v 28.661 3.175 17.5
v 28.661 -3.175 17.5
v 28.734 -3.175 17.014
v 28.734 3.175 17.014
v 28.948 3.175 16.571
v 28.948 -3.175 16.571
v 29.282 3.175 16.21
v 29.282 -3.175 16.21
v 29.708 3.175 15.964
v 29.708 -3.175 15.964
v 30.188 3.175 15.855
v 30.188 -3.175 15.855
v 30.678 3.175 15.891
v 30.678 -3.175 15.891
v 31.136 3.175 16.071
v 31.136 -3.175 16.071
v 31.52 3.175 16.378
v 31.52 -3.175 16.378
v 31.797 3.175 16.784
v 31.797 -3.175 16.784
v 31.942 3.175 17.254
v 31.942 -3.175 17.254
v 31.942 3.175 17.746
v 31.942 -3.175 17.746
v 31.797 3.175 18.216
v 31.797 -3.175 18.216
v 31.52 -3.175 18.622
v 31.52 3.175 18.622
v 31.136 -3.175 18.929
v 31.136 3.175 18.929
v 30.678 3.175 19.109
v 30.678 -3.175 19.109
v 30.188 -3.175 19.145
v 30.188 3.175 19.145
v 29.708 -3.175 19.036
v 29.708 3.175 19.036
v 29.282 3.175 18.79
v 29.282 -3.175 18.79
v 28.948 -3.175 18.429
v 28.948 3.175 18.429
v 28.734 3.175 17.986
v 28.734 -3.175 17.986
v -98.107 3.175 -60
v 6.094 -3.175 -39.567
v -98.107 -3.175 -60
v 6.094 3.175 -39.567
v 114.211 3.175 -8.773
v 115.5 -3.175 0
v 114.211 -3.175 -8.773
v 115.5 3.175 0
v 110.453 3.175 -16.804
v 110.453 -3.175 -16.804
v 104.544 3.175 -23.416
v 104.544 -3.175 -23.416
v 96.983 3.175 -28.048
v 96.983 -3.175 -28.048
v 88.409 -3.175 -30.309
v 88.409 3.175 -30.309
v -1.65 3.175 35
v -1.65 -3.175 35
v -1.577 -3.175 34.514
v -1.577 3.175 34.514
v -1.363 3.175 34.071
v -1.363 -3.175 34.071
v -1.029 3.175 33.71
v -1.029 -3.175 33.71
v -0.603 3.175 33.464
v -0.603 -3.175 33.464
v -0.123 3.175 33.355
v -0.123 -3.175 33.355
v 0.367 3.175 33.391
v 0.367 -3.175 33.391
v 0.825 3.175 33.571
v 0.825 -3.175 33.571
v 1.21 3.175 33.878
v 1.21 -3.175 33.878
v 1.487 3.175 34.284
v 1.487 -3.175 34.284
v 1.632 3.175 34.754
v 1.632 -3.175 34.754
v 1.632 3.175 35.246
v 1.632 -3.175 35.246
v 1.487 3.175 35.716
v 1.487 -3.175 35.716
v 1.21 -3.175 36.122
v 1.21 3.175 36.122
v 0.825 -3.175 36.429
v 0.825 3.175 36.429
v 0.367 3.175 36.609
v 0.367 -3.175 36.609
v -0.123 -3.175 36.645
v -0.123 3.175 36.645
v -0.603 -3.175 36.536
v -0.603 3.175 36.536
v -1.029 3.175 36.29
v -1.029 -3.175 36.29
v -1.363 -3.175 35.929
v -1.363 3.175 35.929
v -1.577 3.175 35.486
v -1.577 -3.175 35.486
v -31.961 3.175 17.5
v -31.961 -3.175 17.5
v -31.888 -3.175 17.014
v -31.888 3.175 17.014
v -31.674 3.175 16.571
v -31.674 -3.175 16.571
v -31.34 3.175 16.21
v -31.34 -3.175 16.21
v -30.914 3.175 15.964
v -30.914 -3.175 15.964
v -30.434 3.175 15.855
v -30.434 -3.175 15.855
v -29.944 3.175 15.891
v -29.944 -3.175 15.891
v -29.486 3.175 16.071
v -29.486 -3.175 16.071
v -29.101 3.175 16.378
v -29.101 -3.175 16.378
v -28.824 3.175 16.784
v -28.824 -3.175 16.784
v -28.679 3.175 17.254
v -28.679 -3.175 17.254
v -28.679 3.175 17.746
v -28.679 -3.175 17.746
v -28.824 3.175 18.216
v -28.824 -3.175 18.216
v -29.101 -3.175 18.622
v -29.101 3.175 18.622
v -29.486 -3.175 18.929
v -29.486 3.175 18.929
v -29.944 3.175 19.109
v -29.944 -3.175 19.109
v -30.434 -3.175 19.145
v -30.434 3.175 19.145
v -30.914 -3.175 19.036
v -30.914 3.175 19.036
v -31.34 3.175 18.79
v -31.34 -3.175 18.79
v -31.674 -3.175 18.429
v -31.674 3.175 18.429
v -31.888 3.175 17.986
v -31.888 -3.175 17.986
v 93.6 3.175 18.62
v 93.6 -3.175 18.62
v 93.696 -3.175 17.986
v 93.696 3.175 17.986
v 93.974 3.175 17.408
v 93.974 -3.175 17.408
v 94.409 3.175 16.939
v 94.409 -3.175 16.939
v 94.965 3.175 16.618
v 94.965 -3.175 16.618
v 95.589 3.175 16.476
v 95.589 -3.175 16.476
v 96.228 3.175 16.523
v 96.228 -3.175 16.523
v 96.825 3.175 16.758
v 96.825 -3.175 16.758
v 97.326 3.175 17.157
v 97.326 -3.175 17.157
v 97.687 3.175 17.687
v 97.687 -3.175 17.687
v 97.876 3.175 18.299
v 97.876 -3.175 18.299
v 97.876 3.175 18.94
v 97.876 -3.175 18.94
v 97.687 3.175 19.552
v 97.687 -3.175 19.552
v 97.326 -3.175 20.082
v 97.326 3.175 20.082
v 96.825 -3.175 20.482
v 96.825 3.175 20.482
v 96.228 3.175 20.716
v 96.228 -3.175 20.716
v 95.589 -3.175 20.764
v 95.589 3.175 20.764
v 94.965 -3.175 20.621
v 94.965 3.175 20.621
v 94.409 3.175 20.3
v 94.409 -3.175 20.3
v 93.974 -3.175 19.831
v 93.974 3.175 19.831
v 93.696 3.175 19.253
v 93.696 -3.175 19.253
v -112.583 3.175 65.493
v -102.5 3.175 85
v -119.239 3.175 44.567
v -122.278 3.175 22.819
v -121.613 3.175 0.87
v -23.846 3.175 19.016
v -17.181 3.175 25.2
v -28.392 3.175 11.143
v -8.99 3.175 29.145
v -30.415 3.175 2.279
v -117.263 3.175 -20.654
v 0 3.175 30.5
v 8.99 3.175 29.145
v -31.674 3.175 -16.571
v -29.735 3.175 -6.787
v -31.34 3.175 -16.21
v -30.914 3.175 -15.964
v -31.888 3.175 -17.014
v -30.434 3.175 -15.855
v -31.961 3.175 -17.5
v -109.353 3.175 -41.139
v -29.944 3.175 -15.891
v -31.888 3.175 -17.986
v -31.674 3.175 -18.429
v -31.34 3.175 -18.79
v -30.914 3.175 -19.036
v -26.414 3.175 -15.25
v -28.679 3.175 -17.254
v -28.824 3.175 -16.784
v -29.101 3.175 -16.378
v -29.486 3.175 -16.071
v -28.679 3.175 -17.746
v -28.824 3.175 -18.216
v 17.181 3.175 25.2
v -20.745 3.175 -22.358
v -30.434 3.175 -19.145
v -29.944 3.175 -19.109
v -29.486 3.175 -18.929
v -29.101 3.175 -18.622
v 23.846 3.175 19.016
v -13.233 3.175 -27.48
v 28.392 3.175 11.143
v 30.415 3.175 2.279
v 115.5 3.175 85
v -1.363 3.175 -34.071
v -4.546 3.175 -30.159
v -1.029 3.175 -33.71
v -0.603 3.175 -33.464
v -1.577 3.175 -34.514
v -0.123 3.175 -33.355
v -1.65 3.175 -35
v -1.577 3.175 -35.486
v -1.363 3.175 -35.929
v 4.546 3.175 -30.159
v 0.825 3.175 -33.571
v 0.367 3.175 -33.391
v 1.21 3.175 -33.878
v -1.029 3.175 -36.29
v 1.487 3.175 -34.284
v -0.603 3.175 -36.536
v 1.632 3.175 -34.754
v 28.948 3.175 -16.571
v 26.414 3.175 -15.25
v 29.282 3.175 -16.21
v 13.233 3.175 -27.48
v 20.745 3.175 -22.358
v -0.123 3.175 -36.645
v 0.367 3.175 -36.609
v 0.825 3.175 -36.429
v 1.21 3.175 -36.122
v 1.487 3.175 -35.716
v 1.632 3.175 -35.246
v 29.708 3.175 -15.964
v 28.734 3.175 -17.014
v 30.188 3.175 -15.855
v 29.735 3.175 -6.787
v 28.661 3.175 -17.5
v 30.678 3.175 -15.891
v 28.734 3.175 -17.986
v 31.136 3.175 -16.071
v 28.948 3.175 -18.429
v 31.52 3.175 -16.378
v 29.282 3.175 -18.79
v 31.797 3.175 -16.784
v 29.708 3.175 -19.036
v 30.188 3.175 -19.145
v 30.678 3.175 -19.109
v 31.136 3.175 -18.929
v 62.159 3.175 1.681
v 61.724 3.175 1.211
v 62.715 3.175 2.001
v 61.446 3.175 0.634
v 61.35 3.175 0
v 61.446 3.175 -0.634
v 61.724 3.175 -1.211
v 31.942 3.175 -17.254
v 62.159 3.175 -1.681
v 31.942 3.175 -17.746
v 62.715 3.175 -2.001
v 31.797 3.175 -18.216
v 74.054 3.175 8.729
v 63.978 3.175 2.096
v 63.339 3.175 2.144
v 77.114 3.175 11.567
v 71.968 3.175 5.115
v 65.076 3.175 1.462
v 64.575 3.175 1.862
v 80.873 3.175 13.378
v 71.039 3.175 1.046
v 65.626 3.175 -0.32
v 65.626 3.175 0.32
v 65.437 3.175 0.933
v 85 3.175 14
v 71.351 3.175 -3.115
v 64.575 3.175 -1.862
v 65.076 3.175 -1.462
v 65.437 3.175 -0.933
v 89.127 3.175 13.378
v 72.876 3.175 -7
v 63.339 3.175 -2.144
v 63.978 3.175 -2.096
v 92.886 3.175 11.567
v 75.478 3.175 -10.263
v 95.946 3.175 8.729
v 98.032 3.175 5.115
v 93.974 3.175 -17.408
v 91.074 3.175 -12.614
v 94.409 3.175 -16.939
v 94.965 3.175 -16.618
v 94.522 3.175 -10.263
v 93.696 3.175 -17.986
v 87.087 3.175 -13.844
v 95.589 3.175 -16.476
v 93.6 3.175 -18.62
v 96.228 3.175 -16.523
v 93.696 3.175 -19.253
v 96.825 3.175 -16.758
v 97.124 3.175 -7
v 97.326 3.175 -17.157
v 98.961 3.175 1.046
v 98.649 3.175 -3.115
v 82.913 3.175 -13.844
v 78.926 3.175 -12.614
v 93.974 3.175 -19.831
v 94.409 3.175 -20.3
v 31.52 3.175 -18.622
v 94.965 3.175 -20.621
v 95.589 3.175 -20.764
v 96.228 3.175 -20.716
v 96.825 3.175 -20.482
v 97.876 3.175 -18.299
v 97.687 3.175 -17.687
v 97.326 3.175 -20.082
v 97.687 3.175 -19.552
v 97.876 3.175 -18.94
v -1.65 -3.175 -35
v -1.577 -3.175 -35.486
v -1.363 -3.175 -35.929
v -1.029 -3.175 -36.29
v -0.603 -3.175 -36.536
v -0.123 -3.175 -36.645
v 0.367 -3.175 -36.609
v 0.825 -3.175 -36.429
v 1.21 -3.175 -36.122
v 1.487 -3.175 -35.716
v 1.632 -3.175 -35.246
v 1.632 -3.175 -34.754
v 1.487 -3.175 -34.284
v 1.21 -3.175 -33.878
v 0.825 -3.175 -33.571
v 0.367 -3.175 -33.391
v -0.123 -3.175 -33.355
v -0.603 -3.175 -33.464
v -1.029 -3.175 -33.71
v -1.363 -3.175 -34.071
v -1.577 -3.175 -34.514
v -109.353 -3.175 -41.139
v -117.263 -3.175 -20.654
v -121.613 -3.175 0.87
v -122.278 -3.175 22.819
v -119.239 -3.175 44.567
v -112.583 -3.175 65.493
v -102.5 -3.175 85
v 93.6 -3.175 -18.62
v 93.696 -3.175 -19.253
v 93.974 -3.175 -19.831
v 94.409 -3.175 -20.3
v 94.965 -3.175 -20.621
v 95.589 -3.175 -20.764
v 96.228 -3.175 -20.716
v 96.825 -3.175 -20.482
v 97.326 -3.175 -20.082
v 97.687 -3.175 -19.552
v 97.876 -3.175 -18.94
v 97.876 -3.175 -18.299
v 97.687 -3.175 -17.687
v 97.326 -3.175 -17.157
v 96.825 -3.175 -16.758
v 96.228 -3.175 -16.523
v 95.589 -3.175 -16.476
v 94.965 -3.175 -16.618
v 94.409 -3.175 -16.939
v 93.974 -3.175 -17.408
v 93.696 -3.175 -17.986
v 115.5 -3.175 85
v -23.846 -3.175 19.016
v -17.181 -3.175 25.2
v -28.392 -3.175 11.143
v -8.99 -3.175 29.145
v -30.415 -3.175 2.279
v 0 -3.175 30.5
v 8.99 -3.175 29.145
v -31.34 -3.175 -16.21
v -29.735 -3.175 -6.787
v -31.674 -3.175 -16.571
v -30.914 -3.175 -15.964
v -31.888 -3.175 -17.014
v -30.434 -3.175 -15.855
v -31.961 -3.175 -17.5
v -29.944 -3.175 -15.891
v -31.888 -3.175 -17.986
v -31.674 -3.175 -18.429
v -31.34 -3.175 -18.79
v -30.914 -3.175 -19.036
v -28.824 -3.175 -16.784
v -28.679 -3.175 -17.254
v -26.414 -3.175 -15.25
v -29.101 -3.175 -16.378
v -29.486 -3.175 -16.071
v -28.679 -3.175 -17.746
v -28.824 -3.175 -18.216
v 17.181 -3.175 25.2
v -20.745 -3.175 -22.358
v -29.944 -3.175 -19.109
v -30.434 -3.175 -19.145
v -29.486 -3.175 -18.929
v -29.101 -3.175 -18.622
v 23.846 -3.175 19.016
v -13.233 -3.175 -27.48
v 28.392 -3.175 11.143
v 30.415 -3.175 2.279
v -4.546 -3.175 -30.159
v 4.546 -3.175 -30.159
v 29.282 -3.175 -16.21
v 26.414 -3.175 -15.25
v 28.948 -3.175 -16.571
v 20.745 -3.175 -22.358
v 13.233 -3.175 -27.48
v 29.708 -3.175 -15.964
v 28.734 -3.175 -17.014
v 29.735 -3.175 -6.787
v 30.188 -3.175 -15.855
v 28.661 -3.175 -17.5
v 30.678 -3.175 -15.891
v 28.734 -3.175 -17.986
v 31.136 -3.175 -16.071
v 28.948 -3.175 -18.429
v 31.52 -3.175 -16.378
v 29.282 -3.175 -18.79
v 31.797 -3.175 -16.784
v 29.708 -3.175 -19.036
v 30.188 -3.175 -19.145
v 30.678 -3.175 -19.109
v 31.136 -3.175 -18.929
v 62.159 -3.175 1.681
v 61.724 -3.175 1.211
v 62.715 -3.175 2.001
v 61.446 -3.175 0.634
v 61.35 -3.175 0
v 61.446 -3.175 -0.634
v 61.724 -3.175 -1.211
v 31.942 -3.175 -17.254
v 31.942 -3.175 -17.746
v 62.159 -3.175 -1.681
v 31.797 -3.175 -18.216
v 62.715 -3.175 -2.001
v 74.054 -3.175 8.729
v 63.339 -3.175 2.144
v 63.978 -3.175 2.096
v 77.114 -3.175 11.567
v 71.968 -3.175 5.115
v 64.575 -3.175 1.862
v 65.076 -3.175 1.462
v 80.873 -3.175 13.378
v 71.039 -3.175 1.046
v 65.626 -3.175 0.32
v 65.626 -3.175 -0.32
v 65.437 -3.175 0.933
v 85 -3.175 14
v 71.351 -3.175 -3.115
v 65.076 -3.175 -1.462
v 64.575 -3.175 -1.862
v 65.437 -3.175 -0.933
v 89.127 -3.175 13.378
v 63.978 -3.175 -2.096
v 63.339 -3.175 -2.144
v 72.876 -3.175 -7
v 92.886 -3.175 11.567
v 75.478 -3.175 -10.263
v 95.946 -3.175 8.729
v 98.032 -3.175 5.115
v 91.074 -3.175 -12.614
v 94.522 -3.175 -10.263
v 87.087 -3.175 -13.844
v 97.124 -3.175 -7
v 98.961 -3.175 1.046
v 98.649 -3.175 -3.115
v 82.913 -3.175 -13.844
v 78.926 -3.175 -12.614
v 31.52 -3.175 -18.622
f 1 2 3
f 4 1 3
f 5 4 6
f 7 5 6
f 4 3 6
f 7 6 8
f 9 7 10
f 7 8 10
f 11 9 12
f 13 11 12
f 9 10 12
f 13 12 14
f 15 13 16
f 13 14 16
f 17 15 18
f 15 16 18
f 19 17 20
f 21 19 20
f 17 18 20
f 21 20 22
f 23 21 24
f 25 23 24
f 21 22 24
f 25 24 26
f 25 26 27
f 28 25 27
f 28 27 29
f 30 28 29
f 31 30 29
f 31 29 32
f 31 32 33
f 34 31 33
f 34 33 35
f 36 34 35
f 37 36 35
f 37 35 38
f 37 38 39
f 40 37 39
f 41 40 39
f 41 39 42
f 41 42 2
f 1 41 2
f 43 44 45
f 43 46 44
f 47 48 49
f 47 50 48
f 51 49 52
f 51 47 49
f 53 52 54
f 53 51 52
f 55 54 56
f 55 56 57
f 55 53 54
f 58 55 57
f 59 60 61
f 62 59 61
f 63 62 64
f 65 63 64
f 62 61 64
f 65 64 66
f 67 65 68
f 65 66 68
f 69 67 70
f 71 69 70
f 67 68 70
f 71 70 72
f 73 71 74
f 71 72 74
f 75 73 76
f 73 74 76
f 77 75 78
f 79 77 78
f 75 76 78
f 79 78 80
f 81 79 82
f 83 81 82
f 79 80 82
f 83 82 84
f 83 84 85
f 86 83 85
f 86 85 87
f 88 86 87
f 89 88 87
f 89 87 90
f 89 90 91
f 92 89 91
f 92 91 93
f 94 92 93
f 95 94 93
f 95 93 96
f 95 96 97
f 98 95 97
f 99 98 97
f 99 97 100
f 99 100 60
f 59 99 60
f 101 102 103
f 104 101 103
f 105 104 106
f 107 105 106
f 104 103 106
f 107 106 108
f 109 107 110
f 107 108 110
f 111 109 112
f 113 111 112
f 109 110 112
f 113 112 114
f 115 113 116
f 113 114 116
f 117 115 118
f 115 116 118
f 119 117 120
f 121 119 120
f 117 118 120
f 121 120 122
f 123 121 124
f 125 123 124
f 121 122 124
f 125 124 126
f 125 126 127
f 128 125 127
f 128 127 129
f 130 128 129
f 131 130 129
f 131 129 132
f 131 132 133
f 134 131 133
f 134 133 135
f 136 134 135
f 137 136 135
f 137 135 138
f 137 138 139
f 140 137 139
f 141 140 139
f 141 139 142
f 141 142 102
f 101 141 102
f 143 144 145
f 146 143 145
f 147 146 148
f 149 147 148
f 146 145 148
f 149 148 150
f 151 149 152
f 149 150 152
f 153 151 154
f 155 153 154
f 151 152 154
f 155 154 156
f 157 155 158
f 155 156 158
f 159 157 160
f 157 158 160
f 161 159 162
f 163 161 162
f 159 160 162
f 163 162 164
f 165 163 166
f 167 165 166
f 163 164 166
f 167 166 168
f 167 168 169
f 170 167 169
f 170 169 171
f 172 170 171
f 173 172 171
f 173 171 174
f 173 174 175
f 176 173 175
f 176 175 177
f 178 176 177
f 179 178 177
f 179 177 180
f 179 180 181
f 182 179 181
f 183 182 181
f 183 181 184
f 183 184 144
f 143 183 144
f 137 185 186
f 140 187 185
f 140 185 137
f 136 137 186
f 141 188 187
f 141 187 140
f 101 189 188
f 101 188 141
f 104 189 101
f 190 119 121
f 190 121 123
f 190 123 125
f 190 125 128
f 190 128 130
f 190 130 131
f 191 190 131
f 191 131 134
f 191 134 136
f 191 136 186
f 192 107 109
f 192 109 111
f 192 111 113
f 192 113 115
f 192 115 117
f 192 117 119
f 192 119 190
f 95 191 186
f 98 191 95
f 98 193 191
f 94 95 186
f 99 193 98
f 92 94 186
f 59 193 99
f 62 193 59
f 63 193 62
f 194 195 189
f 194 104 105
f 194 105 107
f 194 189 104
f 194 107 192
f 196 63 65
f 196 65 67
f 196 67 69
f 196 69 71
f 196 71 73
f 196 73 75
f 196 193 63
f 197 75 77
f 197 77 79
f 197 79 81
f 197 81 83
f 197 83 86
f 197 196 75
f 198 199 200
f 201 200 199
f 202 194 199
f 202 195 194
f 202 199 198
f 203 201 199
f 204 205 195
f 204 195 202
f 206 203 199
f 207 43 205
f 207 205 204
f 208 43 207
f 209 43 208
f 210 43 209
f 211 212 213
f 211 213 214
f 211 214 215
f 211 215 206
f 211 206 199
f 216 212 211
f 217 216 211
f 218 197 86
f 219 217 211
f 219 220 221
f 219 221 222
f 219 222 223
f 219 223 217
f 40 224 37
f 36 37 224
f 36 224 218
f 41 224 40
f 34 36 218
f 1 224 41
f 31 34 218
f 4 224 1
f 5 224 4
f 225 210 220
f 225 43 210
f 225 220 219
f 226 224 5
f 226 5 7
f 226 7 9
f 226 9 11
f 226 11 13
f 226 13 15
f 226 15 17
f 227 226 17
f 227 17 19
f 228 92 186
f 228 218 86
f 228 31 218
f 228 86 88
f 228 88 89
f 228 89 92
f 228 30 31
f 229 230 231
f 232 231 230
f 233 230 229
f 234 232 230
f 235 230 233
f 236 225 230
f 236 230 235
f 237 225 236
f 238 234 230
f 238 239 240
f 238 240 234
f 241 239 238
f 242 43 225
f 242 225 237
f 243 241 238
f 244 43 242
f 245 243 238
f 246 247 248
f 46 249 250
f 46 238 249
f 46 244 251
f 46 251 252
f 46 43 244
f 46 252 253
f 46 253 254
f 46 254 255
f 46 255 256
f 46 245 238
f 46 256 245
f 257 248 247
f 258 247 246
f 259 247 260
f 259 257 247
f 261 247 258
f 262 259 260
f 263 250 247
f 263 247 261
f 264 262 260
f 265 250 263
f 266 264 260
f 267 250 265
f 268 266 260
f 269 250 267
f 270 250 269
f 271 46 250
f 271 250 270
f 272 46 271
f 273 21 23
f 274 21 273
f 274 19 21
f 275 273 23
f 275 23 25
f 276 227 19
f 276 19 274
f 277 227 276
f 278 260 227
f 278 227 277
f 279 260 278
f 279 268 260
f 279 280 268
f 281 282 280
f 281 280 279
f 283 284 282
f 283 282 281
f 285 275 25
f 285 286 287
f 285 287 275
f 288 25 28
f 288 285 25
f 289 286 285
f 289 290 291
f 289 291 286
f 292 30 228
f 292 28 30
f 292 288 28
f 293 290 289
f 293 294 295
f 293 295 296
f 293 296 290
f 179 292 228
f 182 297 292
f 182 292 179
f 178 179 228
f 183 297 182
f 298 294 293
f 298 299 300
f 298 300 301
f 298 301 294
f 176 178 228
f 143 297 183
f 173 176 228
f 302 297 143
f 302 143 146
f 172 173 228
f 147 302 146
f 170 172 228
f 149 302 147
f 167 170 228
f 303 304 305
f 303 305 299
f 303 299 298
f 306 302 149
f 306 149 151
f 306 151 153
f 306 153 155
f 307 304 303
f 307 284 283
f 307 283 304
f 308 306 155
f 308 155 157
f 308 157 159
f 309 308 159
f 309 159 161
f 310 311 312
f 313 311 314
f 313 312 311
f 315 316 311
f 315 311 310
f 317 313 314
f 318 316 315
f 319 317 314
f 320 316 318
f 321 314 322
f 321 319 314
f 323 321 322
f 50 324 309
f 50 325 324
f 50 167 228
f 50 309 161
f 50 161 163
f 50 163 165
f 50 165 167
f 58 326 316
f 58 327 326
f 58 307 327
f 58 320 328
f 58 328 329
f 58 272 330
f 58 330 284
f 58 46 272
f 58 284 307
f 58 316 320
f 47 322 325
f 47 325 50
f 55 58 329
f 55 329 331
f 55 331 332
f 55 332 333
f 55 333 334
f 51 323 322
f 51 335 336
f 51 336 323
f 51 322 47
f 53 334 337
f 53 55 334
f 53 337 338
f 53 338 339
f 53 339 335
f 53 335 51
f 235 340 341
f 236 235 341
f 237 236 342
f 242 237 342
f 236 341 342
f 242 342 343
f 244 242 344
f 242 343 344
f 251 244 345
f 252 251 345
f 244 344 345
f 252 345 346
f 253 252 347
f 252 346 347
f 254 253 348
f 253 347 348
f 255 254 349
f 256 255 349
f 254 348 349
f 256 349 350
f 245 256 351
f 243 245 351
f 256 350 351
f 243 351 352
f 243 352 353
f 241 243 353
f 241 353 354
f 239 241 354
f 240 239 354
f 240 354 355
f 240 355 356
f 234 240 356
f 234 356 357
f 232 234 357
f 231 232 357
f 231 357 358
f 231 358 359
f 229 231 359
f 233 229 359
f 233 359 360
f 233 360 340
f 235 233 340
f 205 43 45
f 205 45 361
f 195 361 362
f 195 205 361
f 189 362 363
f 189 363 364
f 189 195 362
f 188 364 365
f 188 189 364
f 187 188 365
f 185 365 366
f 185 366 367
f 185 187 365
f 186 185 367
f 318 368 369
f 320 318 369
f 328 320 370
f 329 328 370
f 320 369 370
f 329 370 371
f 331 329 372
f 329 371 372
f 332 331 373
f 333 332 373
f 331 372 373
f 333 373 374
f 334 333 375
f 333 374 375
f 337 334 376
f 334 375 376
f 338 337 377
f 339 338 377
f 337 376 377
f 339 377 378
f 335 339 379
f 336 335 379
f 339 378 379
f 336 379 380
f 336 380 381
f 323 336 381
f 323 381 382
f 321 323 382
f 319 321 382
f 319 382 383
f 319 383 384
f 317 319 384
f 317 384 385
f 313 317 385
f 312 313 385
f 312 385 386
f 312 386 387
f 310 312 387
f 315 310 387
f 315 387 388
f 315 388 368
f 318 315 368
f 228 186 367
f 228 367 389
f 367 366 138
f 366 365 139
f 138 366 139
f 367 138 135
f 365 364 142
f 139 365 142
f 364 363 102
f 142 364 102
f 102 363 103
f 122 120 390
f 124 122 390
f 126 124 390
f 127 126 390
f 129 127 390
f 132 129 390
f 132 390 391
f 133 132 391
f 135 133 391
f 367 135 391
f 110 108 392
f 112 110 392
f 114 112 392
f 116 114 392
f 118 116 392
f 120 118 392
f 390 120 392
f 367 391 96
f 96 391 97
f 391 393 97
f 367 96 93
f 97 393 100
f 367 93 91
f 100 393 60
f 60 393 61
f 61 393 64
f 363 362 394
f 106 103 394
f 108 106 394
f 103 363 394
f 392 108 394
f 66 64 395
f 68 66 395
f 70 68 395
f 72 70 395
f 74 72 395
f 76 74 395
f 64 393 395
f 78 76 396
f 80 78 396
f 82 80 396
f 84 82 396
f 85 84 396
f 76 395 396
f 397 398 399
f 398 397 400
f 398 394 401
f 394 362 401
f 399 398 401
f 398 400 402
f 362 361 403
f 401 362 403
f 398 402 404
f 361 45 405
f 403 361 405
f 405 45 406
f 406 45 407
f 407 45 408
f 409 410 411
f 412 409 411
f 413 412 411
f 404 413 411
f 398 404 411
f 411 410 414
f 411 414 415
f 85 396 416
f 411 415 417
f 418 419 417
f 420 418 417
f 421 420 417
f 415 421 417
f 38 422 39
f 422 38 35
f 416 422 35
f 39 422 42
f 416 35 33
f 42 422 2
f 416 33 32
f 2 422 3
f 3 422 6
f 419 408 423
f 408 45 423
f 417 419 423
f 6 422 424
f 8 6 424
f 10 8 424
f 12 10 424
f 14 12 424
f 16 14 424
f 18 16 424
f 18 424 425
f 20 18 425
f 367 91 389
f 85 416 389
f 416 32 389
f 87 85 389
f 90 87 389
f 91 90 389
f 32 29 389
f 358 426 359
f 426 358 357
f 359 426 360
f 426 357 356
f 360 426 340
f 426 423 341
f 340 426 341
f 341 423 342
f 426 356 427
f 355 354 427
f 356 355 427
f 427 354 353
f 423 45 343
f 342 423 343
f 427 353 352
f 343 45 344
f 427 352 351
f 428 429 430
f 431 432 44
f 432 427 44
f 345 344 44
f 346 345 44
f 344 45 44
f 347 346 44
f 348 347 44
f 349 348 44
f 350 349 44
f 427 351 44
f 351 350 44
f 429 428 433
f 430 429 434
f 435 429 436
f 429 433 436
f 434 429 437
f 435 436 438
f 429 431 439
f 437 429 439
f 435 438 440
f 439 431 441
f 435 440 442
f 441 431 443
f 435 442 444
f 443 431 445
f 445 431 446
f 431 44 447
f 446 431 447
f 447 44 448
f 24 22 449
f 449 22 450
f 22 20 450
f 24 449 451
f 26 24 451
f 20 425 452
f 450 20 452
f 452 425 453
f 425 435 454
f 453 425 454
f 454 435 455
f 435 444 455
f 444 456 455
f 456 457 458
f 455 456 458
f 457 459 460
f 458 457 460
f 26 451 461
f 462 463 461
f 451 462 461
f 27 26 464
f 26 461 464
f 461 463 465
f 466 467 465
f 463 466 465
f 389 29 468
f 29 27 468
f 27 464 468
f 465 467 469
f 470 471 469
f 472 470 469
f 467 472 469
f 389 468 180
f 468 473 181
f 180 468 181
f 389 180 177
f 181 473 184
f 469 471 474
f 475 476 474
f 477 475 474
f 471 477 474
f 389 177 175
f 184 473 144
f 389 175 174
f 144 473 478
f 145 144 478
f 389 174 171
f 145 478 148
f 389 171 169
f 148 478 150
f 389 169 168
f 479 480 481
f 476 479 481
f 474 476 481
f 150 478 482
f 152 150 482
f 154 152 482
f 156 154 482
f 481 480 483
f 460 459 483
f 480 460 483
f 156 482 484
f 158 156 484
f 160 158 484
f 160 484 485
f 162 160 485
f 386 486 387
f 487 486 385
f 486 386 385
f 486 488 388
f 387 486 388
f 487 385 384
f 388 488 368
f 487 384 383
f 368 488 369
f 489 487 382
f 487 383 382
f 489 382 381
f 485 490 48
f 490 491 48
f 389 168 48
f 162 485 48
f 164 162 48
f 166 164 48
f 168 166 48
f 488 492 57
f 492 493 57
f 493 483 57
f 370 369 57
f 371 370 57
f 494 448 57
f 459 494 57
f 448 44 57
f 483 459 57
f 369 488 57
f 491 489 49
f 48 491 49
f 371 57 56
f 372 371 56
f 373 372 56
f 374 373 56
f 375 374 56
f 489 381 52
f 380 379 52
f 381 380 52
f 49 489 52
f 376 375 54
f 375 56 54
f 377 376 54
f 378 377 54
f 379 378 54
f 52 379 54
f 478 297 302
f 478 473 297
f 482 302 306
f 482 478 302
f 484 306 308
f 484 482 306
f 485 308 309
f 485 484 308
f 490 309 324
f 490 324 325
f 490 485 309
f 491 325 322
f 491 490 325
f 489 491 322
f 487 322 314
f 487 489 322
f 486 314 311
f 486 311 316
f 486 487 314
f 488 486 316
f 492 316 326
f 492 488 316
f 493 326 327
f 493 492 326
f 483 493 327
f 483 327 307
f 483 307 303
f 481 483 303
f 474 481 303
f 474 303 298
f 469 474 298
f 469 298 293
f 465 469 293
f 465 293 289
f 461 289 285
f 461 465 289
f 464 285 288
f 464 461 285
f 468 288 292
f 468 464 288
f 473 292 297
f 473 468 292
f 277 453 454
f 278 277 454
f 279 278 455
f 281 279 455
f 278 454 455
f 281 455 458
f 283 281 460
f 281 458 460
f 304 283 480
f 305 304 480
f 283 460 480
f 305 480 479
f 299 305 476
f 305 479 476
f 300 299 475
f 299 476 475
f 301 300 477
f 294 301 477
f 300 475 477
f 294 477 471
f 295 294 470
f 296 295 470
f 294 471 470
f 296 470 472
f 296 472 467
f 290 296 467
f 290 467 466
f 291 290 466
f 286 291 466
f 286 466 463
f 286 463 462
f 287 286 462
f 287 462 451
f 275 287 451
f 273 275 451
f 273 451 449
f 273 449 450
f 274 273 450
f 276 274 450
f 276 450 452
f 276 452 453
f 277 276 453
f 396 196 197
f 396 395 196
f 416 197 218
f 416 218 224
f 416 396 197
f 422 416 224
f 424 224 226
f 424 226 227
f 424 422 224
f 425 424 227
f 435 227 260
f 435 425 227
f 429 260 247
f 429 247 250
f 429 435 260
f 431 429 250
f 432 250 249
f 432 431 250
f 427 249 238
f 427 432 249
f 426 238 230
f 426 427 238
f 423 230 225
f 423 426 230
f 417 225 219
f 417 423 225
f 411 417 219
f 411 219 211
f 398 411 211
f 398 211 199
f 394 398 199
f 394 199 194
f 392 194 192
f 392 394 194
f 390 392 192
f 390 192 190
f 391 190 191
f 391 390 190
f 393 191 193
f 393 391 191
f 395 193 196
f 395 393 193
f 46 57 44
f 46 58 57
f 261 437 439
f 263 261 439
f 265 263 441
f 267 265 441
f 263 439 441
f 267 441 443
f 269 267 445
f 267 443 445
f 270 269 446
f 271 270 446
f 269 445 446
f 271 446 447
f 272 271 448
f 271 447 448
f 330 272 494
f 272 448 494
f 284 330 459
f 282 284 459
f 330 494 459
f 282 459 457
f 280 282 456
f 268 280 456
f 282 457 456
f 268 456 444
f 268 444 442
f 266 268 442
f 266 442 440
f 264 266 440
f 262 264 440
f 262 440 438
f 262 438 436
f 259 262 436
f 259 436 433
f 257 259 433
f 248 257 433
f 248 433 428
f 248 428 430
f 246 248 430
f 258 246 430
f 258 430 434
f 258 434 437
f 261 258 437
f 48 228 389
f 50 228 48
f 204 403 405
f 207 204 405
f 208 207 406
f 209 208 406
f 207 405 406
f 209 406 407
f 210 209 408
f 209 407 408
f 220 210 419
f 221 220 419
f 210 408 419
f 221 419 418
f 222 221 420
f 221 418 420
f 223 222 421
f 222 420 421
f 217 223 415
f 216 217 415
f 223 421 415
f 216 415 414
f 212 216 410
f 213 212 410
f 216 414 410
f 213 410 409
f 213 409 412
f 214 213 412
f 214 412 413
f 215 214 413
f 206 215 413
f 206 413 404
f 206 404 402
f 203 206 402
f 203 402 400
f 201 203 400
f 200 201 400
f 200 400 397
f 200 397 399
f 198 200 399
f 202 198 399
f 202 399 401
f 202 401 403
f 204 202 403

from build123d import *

# Parameters (mm, degrees)
SKETCH1_R             = 30.5
SKETCH1_R_2           = 14
BOSS_EXTRUDE1_DEPTH   = 3.175
M4X0_7_TAPPED_HOLE1_D = 3.3
M4_CLEARANCE_HOLE1_D  = 4.3


with BuildPart() as part:
    # Sketch1 → Boss-Extrude1 (new, symmetric)
    with BuildSketch(Plane(origin=(0, 0, 0), x_dir=(1, 0, 0), z_dir=(0, 1, 0))):
        with BuildLine():
            Line((6.094023378, 39.566801218), (-98.107084352, 60))
            ThreePointArc((-98.107084352, 60), (-122.409547316, -11.830277132), (-102.5, -85))
            Line((-102.5, -85), (115.5, -85))
            Line((115.5, -85), (115.5, 0))
            ThreePointArc((115.5, 0), (107.74004307, 20.325856468), (88.408823529, 30.308908297))
            Line((88.408823529, 30.308908297), (6.094023378, 39.566801218))
        make_face()
        with Locations(Location((0, 0, 0), (0, 0, 270))):
            Circle(SKETCH1_R, mode=Mode.SUBTRACT)
        with Locations(Location((85, 0, 0), (0, 0, 270))):
            Circle(SKETCH1_R_2, mode=Mode.SUBTRACT)
    extrude(amount=BOSS_EXTRUDE1_DEPTH, both=True)

    # M4x0.7 Tapped Hole1 (through all)
    with Locations(Plane(origin=(0, 3.175, 0), x_dir=(1, 0, 0), z_dir=(0, 1, 0))):
        with Locations((-30.310889132, 17.5), (0, 35), (30.310889132, 17.5), (30.310889132, -17.5), (0, -35), (-30.310889132, -17.5)):
            Hole(M4X0_7_TAPPED_HOLE1_D / 2)

    # M4 Clearance Hole1 (through all)
    with Locations(Plane(origin=(0, 3.175, 0), x_dir=(1, 0, 0), z_dir=(0, 1, 0))):
        with Locations((63.5, 0), (95.75, 18.619546181), (95.75, -18.619546181)):
            Hole(M4_CLEARANCE_HOLE1_D / 2)


solid = part.part
